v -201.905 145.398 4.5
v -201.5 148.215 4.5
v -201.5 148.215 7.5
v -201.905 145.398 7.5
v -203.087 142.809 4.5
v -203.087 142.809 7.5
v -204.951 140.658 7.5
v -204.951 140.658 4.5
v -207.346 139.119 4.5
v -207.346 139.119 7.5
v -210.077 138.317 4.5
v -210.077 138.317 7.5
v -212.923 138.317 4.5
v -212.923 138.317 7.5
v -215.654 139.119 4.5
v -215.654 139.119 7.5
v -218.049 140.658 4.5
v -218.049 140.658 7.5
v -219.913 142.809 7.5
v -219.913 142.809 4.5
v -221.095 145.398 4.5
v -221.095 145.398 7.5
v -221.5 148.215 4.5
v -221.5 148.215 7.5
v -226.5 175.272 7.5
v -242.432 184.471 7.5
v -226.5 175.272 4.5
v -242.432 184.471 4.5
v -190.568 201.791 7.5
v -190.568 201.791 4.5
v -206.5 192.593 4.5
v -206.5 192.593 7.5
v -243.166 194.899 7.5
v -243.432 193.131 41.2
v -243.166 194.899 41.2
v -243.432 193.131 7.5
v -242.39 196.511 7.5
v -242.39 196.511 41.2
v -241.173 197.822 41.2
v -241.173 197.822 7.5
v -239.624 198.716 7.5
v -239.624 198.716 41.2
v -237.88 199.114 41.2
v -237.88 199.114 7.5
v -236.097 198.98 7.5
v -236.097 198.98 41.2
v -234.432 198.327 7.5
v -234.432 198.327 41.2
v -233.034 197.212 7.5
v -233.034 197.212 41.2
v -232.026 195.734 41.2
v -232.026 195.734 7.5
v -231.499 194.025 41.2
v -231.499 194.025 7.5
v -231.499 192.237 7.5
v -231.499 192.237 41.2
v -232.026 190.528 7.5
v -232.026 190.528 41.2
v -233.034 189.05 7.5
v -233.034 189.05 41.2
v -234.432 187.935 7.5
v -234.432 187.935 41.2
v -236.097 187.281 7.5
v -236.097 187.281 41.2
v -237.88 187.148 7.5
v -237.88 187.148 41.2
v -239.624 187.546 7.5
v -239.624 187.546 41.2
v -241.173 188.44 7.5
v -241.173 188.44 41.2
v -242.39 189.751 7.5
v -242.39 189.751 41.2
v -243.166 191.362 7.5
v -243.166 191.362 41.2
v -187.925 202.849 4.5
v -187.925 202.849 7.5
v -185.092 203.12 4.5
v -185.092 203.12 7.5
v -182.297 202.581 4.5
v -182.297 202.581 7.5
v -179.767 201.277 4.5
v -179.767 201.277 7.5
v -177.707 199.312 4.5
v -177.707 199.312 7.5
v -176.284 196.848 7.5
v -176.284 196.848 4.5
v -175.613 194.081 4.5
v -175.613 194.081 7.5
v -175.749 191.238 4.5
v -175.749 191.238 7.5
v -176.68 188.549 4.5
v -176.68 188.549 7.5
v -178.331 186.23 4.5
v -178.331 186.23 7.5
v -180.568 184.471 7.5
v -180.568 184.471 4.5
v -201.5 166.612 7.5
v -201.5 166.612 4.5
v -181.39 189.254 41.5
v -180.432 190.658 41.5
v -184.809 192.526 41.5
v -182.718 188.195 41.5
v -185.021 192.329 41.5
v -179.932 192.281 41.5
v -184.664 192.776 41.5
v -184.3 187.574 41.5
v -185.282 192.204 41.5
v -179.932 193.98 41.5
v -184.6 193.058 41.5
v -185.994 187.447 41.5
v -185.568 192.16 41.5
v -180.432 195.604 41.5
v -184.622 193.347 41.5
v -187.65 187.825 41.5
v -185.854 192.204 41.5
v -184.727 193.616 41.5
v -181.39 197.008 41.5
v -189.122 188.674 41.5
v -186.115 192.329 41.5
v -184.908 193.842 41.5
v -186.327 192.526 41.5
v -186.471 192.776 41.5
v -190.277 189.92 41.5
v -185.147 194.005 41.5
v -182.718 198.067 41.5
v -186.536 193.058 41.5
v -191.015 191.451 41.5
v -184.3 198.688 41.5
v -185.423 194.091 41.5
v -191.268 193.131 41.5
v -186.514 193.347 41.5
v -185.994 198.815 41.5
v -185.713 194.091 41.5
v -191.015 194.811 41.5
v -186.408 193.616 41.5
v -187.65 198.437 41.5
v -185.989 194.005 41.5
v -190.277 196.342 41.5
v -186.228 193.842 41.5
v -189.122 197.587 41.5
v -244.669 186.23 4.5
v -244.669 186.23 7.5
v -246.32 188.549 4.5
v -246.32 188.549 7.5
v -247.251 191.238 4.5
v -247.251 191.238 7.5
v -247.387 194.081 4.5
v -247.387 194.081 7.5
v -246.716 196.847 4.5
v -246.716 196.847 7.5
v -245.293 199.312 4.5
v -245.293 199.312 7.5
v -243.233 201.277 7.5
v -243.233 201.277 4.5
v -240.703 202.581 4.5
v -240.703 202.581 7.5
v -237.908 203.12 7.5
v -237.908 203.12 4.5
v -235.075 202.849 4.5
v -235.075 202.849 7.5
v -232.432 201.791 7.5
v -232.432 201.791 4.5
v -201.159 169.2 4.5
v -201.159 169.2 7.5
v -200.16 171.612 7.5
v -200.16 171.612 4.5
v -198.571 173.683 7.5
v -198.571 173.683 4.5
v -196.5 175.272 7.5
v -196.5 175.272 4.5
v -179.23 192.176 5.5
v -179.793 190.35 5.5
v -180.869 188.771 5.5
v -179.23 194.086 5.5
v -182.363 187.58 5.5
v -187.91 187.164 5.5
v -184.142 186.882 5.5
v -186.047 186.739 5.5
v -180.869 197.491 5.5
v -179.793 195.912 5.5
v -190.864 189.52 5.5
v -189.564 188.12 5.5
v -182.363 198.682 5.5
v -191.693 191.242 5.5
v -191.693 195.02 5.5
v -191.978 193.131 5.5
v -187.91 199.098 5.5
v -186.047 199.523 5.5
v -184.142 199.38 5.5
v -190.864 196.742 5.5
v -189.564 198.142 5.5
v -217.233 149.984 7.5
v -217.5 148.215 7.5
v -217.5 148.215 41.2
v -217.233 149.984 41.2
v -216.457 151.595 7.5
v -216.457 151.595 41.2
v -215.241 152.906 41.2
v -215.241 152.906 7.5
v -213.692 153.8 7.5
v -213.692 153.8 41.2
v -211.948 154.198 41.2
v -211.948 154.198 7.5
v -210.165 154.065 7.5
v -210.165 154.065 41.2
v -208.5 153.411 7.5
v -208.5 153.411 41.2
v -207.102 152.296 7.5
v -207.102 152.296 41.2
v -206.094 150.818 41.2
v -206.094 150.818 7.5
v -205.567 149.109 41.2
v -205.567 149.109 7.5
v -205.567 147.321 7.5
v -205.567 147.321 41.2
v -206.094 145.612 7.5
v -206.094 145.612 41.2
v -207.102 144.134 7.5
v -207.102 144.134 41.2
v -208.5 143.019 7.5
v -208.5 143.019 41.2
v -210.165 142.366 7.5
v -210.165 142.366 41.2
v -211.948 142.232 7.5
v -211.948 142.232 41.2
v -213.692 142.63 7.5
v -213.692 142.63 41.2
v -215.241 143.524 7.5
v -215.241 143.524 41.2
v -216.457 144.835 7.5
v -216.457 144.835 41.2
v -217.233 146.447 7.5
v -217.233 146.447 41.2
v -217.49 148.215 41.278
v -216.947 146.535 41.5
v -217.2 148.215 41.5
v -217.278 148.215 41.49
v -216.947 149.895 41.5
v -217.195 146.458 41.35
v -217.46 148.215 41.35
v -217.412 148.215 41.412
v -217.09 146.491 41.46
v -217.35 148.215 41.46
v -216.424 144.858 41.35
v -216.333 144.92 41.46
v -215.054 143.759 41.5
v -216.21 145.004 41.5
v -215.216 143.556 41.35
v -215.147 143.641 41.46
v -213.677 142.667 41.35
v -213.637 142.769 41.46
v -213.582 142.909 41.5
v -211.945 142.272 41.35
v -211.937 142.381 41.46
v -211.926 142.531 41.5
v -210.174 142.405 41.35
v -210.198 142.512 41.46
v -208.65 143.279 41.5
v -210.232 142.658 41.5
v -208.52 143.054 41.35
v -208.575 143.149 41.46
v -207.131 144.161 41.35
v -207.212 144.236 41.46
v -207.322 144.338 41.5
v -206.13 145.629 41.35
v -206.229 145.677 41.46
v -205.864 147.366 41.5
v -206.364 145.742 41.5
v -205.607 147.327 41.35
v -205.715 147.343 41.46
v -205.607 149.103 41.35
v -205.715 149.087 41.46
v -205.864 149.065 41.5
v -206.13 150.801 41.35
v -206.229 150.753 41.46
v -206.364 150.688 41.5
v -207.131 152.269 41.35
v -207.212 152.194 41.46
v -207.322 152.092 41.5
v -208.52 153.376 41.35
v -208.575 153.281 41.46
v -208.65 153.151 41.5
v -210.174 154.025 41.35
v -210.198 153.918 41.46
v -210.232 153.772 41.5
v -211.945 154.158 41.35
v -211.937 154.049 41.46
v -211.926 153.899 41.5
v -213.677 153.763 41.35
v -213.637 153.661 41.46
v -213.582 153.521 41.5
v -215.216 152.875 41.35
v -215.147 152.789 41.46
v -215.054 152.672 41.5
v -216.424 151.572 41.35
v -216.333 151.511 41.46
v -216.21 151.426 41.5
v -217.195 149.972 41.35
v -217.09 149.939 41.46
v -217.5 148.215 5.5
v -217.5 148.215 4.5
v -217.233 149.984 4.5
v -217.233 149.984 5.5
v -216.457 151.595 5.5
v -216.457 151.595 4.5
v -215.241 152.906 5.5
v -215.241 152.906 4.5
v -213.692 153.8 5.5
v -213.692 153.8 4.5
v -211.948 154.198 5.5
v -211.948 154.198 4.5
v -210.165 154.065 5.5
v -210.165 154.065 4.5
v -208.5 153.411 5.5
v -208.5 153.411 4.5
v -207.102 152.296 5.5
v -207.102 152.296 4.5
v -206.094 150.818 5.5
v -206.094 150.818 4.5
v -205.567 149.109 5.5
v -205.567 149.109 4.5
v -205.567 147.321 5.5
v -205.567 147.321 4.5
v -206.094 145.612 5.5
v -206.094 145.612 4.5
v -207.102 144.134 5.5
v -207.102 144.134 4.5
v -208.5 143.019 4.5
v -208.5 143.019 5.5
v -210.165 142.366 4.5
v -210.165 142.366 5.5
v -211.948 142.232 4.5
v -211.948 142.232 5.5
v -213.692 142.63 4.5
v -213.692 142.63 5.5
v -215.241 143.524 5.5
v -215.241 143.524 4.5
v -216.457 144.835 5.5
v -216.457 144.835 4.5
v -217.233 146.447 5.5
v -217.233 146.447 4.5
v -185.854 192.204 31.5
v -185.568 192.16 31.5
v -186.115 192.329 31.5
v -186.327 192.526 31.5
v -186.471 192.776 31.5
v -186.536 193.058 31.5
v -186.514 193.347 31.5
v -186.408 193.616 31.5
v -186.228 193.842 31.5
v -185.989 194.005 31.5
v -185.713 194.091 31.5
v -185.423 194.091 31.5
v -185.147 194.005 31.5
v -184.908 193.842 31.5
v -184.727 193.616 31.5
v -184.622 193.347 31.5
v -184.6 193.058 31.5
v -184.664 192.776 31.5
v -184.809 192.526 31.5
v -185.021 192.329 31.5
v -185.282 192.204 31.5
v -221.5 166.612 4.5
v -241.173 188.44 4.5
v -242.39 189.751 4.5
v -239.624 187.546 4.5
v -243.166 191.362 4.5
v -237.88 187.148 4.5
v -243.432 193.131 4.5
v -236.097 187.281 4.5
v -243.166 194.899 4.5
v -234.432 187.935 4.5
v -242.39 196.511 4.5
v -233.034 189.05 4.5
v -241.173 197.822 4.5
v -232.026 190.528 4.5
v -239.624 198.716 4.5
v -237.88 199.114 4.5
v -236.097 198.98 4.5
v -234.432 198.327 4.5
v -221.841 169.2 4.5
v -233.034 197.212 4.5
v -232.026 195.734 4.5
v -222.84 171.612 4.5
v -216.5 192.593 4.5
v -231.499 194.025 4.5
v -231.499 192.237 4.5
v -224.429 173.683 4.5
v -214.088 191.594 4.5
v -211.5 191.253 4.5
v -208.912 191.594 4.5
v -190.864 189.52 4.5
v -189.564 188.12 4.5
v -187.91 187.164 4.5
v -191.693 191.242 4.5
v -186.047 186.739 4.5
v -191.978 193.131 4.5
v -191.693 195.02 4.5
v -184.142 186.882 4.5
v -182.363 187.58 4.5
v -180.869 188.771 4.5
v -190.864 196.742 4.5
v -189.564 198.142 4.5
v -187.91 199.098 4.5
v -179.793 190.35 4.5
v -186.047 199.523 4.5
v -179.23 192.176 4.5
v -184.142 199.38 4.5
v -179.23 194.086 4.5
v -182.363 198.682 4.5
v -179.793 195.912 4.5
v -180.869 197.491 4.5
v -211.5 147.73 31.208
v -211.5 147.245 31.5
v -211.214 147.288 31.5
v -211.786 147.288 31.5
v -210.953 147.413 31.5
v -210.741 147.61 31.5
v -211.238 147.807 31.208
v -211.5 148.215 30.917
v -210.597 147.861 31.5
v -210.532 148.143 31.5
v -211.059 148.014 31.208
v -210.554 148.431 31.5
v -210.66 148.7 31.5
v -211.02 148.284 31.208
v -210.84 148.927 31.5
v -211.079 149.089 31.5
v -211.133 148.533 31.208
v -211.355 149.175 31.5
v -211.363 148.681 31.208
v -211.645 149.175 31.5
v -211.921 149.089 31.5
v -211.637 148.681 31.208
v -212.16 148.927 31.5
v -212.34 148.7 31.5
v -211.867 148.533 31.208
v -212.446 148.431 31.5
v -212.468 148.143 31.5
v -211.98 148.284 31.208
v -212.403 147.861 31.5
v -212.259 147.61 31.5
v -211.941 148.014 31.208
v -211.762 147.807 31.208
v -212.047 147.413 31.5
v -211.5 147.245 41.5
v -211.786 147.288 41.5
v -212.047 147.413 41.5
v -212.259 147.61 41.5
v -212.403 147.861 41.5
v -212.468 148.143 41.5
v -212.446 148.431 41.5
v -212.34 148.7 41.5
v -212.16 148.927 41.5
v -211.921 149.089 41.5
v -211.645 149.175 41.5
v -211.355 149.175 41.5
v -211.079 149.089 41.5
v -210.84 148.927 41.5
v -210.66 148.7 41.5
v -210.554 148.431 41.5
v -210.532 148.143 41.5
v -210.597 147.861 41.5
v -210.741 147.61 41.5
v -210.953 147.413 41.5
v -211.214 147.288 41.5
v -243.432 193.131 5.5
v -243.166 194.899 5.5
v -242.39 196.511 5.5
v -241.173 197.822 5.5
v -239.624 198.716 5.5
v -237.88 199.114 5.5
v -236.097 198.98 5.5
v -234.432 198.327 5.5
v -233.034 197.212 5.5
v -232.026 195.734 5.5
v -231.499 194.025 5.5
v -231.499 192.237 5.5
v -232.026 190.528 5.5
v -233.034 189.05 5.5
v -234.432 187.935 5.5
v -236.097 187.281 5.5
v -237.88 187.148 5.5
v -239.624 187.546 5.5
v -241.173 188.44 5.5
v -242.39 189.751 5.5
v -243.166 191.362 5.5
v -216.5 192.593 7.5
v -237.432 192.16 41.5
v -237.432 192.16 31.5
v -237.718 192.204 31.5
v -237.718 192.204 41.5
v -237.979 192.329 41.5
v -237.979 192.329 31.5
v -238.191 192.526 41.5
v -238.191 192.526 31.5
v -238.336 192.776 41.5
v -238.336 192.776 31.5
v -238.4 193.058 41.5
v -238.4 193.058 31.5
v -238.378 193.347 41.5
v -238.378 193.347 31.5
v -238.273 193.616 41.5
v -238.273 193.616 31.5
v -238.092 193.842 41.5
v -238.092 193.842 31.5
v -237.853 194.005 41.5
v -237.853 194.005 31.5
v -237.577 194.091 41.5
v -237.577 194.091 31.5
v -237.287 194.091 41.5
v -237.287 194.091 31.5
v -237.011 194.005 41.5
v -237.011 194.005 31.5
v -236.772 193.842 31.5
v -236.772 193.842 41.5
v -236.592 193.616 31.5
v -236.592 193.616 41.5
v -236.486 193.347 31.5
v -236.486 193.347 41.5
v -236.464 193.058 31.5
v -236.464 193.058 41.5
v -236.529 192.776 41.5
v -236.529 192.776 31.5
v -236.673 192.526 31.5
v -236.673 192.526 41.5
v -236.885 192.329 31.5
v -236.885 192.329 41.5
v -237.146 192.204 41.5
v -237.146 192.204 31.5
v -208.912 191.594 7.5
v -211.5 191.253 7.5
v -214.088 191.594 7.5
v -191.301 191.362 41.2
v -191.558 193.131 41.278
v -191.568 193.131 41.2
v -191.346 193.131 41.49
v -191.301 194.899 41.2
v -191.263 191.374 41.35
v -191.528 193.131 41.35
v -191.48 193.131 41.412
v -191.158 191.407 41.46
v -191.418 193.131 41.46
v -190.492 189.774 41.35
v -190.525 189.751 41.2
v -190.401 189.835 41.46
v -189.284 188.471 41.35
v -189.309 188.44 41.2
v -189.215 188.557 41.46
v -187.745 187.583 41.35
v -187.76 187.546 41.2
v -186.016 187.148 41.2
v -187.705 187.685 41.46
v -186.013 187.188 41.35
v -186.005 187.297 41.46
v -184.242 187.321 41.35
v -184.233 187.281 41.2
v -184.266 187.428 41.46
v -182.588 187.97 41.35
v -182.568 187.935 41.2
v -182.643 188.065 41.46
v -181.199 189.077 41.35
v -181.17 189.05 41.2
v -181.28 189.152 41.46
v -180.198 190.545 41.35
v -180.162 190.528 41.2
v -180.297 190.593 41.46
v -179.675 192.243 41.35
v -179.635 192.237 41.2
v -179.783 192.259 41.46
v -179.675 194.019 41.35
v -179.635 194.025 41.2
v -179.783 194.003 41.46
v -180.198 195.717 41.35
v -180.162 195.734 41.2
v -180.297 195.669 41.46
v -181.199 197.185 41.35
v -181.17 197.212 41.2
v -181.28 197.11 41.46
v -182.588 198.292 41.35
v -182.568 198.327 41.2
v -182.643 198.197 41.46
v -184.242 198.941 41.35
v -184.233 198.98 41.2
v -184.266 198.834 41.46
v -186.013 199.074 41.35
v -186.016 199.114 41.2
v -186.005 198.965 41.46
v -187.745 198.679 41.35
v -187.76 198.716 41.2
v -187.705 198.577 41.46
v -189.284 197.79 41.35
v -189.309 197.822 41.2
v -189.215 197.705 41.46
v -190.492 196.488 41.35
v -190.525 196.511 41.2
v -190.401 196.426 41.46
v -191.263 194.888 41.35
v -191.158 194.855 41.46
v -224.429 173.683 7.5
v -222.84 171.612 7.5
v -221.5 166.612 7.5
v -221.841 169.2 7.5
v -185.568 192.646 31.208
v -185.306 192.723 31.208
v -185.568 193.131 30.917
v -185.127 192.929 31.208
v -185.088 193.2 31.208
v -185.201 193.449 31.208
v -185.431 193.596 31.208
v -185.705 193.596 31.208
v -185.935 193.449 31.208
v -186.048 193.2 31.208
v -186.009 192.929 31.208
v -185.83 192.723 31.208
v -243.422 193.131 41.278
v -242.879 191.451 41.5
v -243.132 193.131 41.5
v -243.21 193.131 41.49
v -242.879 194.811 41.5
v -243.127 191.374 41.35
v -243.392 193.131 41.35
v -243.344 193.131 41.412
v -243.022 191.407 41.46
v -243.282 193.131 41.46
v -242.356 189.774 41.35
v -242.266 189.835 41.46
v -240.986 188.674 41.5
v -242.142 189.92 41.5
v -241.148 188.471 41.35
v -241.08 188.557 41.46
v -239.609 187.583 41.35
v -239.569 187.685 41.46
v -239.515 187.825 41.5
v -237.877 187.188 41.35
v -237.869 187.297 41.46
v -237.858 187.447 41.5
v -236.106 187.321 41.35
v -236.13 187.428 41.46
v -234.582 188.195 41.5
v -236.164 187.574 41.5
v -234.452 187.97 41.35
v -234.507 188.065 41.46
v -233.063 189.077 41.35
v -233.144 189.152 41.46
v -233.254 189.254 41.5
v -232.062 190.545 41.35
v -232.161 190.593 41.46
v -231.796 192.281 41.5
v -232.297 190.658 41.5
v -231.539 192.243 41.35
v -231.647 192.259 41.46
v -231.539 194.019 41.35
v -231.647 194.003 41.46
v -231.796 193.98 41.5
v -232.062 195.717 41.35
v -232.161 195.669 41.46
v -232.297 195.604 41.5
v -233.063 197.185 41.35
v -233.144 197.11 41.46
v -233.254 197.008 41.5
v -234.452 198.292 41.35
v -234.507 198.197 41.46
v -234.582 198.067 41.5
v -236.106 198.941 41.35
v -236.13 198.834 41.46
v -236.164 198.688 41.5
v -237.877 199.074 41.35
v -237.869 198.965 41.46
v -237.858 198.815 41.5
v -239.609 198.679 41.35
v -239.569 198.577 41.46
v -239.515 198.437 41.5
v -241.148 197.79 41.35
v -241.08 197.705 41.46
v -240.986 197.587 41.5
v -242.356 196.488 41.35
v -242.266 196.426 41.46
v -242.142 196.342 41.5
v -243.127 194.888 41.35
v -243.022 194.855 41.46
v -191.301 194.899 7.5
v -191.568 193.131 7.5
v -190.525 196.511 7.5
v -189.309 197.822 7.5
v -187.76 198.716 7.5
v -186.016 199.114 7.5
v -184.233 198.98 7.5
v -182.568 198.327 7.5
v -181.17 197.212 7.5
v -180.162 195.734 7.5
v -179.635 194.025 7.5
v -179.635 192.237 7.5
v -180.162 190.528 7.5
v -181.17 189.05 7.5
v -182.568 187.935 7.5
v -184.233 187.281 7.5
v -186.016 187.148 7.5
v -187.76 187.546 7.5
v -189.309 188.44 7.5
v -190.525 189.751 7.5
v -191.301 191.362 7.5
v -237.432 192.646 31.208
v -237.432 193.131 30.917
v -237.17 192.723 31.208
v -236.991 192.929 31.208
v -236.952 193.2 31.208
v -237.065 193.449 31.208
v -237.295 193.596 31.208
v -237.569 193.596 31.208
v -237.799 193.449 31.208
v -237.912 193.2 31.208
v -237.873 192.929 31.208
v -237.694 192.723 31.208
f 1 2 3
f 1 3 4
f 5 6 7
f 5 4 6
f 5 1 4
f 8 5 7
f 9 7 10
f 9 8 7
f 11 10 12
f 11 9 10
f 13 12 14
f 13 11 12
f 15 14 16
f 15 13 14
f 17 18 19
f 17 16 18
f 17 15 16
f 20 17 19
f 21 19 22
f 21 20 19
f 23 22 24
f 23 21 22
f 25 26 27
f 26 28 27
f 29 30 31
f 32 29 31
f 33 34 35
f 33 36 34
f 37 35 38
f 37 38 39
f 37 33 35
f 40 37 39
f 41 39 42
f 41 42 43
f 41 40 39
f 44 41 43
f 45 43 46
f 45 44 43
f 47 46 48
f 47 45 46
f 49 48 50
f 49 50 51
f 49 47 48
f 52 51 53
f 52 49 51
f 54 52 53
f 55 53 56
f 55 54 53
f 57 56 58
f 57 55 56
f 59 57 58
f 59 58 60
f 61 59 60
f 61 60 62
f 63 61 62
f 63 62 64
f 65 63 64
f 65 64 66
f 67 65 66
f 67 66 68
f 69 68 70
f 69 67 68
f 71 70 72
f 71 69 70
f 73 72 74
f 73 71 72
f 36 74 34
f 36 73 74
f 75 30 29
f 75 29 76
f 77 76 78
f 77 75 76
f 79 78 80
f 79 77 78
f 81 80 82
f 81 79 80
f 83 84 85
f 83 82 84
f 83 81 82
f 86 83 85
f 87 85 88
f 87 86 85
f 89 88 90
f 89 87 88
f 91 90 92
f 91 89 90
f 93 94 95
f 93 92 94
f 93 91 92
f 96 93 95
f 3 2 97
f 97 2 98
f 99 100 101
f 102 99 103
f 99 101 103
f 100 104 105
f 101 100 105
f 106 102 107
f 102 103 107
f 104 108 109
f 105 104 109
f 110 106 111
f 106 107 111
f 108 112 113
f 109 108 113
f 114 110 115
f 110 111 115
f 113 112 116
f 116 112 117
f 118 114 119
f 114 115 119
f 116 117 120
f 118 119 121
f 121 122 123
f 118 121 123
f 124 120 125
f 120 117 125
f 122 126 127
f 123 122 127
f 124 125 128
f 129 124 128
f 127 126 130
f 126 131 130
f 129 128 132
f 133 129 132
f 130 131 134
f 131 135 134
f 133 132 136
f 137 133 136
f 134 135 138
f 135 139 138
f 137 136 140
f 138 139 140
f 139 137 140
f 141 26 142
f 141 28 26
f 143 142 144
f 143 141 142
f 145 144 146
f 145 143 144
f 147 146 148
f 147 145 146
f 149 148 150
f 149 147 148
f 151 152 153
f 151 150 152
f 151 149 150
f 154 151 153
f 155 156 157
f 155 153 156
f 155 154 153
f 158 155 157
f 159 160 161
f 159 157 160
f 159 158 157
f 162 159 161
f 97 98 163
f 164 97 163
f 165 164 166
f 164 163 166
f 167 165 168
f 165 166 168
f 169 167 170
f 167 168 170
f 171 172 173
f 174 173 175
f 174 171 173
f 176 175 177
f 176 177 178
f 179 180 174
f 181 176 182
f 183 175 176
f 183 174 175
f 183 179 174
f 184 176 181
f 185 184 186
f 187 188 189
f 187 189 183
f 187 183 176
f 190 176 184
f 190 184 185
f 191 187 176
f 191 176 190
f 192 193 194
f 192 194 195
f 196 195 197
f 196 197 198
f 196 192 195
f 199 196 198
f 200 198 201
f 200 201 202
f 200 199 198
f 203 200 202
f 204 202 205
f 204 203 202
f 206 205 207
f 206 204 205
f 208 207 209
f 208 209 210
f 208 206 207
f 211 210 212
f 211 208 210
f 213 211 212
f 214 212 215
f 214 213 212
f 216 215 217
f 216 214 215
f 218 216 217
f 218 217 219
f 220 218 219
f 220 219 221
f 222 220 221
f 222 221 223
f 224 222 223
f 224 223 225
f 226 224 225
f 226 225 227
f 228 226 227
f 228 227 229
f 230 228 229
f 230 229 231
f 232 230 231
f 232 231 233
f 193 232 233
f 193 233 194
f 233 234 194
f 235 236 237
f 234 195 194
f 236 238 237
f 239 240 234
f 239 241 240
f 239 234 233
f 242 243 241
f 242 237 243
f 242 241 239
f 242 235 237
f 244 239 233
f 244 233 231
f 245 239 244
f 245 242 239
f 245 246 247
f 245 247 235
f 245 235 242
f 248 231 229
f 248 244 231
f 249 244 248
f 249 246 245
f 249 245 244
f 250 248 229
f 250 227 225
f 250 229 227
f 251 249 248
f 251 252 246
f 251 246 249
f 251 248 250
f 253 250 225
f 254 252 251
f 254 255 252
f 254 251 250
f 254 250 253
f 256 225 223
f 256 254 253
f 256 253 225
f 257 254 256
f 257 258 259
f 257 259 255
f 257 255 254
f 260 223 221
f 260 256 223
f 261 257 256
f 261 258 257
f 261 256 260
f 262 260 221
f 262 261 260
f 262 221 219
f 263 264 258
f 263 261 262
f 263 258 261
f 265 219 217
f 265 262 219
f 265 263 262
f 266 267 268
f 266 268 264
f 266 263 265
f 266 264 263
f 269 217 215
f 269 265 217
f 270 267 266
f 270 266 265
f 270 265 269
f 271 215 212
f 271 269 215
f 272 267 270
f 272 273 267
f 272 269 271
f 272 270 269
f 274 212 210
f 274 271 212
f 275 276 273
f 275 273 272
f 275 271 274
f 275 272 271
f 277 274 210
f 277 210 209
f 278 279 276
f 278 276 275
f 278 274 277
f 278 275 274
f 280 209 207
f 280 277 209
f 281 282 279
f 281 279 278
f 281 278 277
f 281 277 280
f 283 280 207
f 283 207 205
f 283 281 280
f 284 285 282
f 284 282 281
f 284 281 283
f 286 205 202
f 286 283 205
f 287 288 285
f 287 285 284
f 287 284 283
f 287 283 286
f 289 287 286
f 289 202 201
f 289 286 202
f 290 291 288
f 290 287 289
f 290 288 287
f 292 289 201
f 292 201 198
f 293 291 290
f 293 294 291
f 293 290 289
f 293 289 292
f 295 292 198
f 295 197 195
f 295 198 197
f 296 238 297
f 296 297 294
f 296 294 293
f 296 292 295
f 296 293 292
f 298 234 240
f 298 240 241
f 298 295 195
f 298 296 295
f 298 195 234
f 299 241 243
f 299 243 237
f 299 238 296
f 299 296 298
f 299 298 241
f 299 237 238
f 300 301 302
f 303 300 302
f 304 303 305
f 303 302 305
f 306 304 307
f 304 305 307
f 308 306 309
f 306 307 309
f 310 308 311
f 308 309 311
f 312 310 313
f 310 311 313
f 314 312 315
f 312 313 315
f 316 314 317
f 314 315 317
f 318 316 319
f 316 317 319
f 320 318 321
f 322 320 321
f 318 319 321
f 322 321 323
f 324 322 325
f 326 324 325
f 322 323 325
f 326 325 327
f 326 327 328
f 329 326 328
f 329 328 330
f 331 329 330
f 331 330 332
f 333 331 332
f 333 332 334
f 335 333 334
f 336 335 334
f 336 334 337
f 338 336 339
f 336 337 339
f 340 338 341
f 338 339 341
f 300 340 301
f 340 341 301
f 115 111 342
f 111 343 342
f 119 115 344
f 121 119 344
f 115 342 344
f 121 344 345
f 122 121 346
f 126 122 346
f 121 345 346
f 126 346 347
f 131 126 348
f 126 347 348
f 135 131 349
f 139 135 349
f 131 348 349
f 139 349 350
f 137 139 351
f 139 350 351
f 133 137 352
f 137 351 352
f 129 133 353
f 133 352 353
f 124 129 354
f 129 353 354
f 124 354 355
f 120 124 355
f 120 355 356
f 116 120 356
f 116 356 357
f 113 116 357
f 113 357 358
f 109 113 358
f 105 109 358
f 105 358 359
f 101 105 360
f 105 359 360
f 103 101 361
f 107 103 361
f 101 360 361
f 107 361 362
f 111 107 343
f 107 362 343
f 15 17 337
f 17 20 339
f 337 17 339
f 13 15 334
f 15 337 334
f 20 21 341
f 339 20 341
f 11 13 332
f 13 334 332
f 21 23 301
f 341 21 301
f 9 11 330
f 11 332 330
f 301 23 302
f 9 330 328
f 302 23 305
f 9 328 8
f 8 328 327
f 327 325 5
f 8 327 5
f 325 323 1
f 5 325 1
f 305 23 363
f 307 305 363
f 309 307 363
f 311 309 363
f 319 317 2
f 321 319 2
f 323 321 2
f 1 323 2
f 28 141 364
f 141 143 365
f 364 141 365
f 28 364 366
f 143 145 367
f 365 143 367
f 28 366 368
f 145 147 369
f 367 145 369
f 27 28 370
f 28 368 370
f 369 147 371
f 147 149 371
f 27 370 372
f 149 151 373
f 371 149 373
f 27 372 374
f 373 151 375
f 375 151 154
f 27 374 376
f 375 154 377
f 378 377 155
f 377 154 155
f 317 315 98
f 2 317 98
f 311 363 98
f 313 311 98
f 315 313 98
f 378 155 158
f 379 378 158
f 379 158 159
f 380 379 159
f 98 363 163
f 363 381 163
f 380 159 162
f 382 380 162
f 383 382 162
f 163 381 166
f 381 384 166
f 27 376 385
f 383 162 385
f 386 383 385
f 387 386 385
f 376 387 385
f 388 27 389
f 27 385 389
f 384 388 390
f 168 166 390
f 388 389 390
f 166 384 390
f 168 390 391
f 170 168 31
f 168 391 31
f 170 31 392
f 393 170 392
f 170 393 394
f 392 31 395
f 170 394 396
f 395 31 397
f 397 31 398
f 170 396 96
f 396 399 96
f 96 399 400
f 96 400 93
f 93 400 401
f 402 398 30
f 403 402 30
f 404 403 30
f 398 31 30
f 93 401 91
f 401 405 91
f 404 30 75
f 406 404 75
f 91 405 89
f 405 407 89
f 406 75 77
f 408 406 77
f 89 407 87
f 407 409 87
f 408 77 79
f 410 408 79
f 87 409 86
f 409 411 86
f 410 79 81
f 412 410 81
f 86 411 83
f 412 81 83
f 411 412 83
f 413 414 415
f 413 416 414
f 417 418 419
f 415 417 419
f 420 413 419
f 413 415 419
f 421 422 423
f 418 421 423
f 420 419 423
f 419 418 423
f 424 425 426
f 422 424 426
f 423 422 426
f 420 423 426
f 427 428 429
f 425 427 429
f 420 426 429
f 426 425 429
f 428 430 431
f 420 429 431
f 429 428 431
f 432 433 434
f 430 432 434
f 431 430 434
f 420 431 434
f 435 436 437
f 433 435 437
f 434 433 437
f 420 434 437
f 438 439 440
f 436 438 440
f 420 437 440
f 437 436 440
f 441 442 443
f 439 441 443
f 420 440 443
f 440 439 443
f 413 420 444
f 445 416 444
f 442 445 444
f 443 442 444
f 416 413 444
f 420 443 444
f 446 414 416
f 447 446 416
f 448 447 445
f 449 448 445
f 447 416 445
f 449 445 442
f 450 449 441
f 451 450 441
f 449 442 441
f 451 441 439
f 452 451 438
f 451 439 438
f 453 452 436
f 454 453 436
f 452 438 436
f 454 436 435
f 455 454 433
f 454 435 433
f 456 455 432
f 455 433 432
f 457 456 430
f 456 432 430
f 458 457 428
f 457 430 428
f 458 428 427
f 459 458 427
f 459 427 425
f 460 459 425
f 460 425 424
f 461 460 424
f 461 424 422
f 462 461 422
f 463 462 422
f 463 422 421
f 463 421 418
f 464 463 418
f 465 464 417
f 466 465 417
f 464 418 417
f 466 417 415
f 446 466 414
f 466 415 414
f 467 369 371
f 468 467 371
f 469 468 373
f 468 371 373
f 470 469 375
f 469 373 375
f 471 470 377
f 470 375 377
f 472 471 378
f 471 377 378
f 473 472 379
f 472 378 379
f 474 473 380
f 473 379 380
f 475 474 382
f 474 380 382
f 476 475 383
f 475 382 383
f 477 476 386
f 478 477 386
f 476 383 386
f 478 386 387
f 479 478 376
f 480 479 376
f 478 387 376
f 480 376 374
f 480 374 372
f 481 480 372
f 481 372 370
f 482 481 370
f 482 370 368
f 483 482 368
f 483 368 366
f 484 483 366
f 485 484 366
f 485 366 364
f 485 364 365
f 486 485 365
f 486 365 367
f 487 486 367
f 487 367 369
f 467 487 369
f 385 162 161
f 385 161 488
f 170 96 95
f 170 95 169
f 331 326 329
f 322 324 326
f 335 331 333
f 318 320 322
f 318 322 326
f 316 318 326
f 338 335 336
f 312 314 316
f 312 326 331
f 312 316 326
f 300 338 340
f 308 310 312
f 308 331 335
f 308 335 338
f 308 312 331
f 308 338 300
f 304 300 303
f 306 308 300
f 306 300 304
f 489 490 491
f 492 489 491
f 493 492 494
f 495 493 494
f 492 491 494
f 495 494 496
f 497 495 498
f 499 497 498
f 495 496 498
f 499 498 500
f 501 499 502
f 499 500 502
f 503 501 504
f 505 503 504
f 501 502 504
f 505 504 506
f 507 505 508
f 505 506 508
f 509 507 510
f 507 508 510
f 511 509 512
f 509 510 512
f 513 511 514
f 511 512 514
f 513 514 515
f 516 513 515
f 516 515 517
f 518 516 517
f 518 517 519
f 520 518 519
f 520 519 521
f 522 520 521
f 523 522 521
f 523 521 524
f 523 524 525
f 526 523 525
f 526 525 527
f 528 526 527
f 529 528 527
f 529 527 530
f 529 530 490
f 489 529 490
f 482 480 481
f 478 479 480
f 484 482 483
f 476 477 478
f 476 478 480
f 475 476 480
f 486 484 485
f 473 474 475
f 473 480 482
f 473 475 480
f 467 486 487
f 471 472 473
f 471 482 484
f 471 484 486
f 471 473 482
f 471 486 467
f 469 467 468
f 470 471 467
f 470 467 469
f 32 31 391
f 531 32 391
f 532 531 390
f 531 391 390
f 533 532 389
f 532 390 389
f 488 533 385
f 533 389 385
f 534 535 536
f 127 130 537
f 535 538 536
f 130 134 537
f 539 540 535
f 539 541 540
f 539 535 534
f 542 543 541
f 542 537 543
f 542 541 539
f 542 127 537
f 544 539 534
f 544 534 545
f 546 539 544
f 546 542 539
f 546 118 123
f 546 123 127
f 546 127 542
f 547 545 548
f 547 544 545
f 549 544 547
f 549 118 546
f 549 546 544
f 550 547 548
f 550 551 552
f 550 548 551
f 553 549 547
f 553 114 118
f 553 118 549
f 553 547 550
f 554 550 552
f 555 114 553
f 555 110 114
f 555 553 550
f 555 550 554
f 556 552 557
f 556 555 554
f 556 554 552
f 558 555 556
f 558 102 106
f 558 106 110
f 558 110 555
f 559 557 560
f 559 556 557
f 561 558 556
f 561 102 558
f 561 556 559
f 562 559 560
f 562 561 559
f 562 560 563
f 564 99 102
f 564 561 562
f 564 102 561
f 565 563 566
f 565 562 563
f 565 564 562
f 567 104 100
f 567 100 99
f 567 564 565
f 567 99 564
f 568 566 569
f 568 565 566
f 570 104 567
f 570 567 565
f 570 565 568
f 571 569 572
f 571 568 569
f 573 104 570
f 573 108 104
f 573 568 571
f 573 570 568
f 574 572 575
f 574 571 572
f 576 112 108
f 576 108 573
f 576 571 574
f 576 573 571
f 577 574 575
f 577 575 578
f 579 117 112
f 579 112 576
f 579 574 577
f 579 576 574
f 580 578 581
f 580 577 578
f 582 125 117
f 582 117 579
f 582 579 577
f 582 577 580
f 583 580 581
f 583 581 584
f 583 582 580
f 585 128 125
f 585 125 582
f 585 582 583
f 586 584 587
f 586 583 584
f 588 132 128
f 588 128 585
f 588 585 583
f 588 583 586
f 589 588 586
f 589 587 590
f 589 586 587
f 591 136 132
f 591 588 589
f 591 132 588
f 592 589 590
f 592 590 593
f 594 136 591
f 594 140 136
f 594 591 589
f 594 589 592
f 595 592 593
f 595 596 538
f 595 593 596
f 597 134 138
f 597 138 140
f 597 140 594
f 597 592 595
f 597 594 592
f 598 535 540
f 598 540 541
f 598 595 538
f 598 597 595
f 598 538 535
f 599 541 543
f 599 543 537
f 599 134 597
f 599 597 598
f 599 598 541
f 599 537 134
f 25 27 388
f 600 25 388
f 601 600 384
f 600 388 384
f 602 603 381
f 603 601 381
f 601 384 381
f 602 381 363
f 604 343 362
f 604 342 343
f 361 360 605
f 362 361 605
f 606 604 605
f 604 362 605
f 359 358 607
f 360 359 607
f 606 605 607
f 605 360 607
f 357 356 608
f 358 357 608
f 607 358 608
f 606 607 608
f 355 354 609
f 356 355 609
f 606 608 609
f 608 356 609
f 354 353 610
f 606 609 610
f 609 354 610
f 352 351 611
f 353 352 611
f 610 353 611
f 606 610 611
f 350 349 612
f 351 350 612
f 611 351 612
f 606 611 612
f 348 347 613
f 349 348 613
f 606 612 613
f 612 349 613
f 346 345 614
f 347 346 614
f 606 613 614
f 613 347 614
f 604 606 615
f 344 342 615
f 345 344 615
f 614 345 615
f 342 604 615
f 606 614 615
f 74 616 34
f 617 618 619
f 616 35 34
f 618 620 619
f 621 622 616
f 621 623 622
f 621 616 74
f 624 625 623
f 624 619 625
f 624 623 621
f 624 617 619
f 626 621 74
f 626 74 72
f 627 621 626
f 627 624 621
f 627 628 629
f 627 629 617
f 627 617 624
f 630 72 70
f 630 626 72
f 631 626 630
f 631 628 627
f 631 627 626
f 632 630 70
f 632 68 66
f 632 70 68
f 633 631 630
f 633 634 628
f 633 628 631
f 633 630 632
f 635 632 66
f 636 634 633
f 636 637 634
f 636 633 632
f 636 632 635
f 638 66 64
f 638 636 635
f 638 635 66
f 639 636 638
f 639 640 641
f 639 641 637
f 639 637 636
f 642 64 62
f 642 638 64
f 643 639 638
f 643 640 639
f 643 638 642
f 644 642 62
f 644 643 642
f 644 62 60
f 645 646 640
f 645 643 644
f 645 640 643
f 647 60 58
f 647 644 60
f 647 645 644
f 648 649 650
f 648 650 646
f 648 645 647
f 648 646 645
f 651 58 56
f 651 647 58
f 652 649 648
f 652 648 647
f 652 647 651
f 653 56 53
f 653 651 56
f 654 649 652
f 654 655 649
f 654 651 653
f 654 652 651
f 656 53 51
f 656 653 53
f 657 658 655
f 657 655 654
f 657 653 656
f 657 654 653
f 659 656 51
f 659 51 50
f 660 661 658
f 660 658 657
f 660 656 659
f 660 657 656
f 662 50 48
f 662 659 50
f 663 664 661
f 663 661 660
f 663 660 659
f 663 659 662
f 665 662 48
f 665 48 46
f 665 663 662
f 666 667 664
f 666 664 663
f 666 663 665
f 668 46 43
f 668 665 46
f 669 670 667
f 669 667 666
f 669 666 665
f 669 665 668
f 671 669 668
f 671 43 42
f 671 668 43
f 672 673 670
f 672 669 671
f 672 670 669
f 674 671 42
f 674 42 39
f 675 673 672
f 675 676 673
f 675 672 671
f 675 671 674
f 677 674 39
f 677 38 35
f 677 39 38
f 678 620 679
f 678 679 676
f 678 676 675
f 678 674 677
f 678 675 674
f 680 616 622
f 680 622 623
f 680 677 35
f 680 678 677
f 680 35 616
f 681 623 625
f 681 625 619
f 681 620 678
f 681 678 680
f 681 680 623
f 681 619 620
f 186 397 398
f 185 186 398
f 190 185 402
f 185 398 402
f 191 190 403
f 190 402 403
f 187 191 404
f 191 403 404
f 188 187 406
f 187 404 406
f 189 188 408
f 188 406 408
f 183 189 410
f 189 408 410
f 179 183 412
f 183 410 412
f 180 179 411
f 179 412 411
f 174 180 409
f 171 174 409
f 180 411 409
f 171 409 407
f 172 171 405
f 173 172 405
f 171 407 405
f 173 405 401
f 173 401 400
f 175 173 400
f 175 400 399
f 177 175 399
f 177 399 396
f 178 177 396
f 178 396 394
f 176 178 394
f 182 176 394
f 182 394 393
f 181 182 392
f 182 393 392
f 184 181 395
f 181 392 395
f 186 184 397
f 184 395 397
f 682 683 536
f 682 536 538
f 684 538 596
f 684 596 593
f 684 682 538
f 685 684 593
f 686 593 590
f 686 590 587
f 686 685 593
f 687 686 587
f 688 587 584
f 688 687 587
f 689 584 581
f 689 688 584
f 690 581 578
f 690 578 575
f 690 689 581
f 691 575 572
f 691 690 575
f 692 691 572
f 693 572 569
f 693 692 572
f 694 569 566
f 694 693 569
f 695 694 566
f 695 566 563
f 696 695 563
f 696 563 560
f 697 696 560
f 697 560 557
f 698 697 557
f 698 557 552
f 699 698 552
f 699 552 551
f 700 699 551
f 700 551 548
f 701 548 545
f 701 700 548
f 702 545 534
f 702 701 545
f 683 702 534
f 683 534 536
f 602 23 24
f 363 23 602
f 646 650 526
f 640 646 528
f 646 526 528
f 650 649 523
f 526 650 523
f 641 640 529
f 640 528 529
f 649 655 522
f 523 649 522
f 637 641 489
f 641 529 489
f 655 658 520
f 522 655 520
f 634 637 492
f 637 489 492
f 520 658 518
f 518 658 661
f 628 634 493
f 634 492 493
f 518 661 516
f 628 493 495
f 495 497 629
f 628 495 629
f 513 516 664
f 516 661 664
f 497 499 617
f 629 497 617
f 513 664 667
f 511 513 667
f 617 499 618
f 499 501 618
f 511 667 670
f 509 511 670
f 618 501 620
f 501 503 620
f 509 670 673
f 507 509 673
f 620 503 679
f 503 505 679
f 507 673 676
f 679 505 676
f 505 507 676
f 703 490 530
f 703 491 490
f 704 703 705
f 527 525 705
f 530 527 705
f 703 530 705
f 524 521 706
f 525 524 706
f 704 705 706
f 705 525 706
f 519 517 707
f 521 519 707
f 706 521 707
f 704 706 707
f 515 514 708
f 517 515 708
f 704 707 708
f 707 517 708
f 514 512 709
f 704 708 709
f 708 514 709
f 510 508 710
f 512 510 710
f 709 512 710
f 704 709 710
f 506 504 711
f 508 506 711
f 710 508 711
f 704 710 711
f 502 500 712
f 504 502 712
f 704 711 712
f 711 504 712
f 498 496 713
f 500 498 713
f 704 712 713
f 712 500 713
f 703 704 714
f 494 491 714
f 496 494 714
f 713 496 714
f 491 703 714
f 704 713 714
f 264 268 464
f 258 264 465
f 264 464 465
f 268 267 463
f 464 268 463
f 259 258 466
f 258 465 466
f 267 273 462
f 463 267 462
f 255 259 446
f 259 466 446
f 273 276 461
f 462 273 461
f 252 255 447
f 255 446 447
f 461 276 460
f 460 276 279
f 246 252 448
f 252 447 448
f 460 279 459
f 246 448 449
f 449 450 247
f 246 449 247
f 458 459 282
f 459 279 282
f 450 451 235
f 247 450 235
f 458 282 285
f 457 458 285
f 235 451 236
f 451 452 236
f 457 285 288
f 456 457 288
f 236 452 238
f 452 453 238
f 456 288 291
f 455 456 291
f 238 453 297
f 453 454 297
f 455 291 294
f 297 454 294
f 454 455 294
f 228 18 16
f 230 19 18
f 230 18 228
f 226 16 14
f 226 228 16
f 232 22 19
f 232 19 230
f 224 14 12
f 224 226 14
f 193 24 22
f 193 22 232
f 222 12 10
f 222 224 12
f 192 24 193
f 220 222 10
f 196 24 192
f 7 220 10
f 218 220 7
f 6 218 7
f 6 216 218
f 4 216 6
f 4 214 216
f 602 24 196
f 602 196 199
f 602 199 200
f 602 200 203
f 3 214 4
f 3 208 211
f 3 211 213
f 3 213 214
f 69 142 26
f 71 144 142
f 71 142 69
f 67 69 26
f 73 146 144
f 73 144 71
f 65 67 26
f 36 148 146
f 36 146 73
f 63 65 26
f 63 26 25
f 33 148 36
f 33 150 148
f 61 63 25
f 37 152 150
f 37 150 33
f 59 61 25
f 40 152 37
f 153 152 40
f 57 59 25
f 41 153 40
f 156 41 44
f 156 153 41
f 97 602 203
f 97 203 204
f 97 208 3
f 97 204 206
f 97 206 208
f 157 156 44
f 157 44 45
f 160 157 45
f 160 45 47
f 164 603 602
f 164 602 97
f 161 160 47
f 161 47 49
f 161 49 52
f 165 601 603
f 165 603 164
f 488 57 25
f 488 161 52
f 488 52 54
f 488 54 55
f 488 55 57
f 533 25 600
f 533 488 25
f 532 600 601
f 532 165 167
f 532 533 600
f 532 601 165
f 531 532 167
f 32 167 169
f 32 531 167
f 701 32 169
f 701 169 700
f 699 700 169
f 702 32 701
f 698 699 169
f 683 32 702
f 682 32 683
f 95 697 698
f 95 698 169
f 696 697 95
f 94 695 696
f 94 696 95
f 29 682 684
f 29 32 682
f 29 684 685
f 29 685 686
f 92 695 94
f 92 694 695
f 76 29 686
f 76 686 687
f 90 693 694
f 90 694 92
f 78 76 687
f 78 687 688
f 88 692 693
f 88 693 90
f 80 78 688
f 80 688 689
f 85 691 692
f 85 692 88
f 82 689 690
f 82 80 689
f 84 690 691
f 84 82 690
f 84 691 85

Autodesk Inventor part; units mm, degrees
ref_plane "YZ Plane" through (0, 0, 0) normal (1, 0, 0) x (0, 1, 0)
ref_plane "工作平面5" through (-8, 0, 4.5) normal (0, 0, 1) x (1, 0, 0)
sketch "草图5" plane through (-8, 0, 4.5) normal (0, 0, 1) x (1, 0, 0)
  arc A0 (-229.373, 177.0271) -> (-229.1311, 177.052) centre (-230.6821, 190.9658) ccw
  circle A1 centre (-229.4321, 193.1309) radius 6
  circle A2 centre (-177.5679, 193.1309) radius 6
  circle A3 centre (-203.5, 148.2151) radius 6
  arc A4 (-172.5679, 184.4706) -> (-182.5679, 201.7911) centre (-177.5679, 193.1309) ccw
  arc A5 (-224.4321, 201.7911) -> (-234.4321, 184.4706) centre (-229.4321, 193.1309) ccw
  arc A6 (-213.5, 148.2151) -> (-193.5, 148.2151) centre (-203.5, 148.2151) ccw
  line L0 (-234.4321, 184.4706) -> (-218.5, 175.2722)
  line L1 (-172.5679, 184.4706) -> (-188.5, 175.2722)
  line L2 (-224.4321, 201.7911) -> (-208.5, 192.5927)
  line L3 (-182.5679, 201.7911) -> (-198.5, 192.5927)
  line L4 (-213.5, 148.2151) -> (-213.5, 166.6119)
  line L5 (-193.5, 148.2151) -> (-193.5, 166.6119)
  line L6 (-206, 177.7999) -> (-206, 178.2297)
  arc A7 (-208.5, 192.5927) -> (-198.5, 192.5927) centre (-203.5, 201.2529) ccw
  arc A8 (-188.5, 175.2722) -> (-193.5, 166.6119) centre (-183.5, 166.6119) ccw
  arc A9 (-213.5, 166.6119) -> (-218.5, 175.2722) centre (-223.5, 166.6119) ccw
  point P0 (8, 0)
  point P1 (-184.4262, 177.6242)
  point P2 (-222.5767, 177.6259)
  dimension "d31" = 12
  dimension "d33" = 12
  dimension "d37" = 20
  dimension "d38" = 20
  dimension "d44" = 10
  dimension "d87" = 12
extrude "拉伸1" add sketch "草图5" along normal blind 3
ref_plane "工作平面2" through (-8, 0, 7.5) normal (0, 0, 1) x (1, 0, 0)
sketch "草图8" plane through (-8, 0, 4.5) normal (0, 0, -1) x (-1, 0, 0)
  circle A0 centre (203.5, 148.2151) radius 6 projected
  circle A1 centre (203.5, 148.2151) radius 6
  circle A2 centre (229.4321, 193.1309) radius 6 projected
  circle A3 centre (229.4321, 193.1309) radius 6
  circle A4 centre (177.5679, 193.1309) radius 6 projected
  circle A5 centre (177.5679, 193.1309) radius 6
  point P0 (-8, 0)
sketch "草图9" plane through (-8, 0, 4.5) normal (0, 0, -1) x (-1, 0, 0)
  point P0 (-8, 0)
extrude "拉伸3" add sketch "草图8" against normal blind 37
hole "孔4" at (-237.4321, 193.1309, 41.5) direction (0, 0, -1) diameter 1.941 depth 10 tip angle 118 thread size "3-48 UNC" class "2B" standard "ANSI Unified Screw Threads"
hole "孔5" at (-185.5679, 193.1309, 41.5) direction (0, 0, -1) diameter 1.941 depth 10 tip angle 118 thread size "3-48 UNC" class "2B" standard "ANSI Unified Screw Threads"
hole "孔6" at (-211.5, 148.2151, 41.5) direction (0, 0, -1) diameter 1.941 depth 10 tip angle 118 thread size "3-48 UNC" class "2B" standard "ANSI Unified Screw Threads"
fillet "圆角4" radius 0.3 3 edges at (-231.4321, 193.1309, 41.5) (-179.5679, 193.1309, 41.5) (-205.5, 148.2151, 41.5)
sketch "草图10" plane through (-8, 0, 4.5) normal (0, 0, -1) x (-1, 0, 0)
  circle A0 centre (229.4321, 193.1309) radius 6
  circle A1 centre (203.5, 148.2151) radius 6
  circle A2 centre (177.5679, 193.1309) radius 6.4097
  point P0 (-8, 0)
extrude "拉伸4" cut sketch "草图10" against normal blind 1
equation "\"折弯半径\" = 厚度"
equation "\"折弯释压宽度\" = 厚度"
equation "\"折弯释压深度\" = 0.5 * 厚度"
equation "\"拐角释压尺寸\" = 4 * 厚度"
equation "\"最小余量\" = 2 * 厚度"
equation "\"过渡半径\" = 折弯半径"
equation "\"Jacobi半径尺寸\" = 折弯半径"
equation "\"间隙大小\" = 厚度"
equation "\"厚度\" = 0.5"
